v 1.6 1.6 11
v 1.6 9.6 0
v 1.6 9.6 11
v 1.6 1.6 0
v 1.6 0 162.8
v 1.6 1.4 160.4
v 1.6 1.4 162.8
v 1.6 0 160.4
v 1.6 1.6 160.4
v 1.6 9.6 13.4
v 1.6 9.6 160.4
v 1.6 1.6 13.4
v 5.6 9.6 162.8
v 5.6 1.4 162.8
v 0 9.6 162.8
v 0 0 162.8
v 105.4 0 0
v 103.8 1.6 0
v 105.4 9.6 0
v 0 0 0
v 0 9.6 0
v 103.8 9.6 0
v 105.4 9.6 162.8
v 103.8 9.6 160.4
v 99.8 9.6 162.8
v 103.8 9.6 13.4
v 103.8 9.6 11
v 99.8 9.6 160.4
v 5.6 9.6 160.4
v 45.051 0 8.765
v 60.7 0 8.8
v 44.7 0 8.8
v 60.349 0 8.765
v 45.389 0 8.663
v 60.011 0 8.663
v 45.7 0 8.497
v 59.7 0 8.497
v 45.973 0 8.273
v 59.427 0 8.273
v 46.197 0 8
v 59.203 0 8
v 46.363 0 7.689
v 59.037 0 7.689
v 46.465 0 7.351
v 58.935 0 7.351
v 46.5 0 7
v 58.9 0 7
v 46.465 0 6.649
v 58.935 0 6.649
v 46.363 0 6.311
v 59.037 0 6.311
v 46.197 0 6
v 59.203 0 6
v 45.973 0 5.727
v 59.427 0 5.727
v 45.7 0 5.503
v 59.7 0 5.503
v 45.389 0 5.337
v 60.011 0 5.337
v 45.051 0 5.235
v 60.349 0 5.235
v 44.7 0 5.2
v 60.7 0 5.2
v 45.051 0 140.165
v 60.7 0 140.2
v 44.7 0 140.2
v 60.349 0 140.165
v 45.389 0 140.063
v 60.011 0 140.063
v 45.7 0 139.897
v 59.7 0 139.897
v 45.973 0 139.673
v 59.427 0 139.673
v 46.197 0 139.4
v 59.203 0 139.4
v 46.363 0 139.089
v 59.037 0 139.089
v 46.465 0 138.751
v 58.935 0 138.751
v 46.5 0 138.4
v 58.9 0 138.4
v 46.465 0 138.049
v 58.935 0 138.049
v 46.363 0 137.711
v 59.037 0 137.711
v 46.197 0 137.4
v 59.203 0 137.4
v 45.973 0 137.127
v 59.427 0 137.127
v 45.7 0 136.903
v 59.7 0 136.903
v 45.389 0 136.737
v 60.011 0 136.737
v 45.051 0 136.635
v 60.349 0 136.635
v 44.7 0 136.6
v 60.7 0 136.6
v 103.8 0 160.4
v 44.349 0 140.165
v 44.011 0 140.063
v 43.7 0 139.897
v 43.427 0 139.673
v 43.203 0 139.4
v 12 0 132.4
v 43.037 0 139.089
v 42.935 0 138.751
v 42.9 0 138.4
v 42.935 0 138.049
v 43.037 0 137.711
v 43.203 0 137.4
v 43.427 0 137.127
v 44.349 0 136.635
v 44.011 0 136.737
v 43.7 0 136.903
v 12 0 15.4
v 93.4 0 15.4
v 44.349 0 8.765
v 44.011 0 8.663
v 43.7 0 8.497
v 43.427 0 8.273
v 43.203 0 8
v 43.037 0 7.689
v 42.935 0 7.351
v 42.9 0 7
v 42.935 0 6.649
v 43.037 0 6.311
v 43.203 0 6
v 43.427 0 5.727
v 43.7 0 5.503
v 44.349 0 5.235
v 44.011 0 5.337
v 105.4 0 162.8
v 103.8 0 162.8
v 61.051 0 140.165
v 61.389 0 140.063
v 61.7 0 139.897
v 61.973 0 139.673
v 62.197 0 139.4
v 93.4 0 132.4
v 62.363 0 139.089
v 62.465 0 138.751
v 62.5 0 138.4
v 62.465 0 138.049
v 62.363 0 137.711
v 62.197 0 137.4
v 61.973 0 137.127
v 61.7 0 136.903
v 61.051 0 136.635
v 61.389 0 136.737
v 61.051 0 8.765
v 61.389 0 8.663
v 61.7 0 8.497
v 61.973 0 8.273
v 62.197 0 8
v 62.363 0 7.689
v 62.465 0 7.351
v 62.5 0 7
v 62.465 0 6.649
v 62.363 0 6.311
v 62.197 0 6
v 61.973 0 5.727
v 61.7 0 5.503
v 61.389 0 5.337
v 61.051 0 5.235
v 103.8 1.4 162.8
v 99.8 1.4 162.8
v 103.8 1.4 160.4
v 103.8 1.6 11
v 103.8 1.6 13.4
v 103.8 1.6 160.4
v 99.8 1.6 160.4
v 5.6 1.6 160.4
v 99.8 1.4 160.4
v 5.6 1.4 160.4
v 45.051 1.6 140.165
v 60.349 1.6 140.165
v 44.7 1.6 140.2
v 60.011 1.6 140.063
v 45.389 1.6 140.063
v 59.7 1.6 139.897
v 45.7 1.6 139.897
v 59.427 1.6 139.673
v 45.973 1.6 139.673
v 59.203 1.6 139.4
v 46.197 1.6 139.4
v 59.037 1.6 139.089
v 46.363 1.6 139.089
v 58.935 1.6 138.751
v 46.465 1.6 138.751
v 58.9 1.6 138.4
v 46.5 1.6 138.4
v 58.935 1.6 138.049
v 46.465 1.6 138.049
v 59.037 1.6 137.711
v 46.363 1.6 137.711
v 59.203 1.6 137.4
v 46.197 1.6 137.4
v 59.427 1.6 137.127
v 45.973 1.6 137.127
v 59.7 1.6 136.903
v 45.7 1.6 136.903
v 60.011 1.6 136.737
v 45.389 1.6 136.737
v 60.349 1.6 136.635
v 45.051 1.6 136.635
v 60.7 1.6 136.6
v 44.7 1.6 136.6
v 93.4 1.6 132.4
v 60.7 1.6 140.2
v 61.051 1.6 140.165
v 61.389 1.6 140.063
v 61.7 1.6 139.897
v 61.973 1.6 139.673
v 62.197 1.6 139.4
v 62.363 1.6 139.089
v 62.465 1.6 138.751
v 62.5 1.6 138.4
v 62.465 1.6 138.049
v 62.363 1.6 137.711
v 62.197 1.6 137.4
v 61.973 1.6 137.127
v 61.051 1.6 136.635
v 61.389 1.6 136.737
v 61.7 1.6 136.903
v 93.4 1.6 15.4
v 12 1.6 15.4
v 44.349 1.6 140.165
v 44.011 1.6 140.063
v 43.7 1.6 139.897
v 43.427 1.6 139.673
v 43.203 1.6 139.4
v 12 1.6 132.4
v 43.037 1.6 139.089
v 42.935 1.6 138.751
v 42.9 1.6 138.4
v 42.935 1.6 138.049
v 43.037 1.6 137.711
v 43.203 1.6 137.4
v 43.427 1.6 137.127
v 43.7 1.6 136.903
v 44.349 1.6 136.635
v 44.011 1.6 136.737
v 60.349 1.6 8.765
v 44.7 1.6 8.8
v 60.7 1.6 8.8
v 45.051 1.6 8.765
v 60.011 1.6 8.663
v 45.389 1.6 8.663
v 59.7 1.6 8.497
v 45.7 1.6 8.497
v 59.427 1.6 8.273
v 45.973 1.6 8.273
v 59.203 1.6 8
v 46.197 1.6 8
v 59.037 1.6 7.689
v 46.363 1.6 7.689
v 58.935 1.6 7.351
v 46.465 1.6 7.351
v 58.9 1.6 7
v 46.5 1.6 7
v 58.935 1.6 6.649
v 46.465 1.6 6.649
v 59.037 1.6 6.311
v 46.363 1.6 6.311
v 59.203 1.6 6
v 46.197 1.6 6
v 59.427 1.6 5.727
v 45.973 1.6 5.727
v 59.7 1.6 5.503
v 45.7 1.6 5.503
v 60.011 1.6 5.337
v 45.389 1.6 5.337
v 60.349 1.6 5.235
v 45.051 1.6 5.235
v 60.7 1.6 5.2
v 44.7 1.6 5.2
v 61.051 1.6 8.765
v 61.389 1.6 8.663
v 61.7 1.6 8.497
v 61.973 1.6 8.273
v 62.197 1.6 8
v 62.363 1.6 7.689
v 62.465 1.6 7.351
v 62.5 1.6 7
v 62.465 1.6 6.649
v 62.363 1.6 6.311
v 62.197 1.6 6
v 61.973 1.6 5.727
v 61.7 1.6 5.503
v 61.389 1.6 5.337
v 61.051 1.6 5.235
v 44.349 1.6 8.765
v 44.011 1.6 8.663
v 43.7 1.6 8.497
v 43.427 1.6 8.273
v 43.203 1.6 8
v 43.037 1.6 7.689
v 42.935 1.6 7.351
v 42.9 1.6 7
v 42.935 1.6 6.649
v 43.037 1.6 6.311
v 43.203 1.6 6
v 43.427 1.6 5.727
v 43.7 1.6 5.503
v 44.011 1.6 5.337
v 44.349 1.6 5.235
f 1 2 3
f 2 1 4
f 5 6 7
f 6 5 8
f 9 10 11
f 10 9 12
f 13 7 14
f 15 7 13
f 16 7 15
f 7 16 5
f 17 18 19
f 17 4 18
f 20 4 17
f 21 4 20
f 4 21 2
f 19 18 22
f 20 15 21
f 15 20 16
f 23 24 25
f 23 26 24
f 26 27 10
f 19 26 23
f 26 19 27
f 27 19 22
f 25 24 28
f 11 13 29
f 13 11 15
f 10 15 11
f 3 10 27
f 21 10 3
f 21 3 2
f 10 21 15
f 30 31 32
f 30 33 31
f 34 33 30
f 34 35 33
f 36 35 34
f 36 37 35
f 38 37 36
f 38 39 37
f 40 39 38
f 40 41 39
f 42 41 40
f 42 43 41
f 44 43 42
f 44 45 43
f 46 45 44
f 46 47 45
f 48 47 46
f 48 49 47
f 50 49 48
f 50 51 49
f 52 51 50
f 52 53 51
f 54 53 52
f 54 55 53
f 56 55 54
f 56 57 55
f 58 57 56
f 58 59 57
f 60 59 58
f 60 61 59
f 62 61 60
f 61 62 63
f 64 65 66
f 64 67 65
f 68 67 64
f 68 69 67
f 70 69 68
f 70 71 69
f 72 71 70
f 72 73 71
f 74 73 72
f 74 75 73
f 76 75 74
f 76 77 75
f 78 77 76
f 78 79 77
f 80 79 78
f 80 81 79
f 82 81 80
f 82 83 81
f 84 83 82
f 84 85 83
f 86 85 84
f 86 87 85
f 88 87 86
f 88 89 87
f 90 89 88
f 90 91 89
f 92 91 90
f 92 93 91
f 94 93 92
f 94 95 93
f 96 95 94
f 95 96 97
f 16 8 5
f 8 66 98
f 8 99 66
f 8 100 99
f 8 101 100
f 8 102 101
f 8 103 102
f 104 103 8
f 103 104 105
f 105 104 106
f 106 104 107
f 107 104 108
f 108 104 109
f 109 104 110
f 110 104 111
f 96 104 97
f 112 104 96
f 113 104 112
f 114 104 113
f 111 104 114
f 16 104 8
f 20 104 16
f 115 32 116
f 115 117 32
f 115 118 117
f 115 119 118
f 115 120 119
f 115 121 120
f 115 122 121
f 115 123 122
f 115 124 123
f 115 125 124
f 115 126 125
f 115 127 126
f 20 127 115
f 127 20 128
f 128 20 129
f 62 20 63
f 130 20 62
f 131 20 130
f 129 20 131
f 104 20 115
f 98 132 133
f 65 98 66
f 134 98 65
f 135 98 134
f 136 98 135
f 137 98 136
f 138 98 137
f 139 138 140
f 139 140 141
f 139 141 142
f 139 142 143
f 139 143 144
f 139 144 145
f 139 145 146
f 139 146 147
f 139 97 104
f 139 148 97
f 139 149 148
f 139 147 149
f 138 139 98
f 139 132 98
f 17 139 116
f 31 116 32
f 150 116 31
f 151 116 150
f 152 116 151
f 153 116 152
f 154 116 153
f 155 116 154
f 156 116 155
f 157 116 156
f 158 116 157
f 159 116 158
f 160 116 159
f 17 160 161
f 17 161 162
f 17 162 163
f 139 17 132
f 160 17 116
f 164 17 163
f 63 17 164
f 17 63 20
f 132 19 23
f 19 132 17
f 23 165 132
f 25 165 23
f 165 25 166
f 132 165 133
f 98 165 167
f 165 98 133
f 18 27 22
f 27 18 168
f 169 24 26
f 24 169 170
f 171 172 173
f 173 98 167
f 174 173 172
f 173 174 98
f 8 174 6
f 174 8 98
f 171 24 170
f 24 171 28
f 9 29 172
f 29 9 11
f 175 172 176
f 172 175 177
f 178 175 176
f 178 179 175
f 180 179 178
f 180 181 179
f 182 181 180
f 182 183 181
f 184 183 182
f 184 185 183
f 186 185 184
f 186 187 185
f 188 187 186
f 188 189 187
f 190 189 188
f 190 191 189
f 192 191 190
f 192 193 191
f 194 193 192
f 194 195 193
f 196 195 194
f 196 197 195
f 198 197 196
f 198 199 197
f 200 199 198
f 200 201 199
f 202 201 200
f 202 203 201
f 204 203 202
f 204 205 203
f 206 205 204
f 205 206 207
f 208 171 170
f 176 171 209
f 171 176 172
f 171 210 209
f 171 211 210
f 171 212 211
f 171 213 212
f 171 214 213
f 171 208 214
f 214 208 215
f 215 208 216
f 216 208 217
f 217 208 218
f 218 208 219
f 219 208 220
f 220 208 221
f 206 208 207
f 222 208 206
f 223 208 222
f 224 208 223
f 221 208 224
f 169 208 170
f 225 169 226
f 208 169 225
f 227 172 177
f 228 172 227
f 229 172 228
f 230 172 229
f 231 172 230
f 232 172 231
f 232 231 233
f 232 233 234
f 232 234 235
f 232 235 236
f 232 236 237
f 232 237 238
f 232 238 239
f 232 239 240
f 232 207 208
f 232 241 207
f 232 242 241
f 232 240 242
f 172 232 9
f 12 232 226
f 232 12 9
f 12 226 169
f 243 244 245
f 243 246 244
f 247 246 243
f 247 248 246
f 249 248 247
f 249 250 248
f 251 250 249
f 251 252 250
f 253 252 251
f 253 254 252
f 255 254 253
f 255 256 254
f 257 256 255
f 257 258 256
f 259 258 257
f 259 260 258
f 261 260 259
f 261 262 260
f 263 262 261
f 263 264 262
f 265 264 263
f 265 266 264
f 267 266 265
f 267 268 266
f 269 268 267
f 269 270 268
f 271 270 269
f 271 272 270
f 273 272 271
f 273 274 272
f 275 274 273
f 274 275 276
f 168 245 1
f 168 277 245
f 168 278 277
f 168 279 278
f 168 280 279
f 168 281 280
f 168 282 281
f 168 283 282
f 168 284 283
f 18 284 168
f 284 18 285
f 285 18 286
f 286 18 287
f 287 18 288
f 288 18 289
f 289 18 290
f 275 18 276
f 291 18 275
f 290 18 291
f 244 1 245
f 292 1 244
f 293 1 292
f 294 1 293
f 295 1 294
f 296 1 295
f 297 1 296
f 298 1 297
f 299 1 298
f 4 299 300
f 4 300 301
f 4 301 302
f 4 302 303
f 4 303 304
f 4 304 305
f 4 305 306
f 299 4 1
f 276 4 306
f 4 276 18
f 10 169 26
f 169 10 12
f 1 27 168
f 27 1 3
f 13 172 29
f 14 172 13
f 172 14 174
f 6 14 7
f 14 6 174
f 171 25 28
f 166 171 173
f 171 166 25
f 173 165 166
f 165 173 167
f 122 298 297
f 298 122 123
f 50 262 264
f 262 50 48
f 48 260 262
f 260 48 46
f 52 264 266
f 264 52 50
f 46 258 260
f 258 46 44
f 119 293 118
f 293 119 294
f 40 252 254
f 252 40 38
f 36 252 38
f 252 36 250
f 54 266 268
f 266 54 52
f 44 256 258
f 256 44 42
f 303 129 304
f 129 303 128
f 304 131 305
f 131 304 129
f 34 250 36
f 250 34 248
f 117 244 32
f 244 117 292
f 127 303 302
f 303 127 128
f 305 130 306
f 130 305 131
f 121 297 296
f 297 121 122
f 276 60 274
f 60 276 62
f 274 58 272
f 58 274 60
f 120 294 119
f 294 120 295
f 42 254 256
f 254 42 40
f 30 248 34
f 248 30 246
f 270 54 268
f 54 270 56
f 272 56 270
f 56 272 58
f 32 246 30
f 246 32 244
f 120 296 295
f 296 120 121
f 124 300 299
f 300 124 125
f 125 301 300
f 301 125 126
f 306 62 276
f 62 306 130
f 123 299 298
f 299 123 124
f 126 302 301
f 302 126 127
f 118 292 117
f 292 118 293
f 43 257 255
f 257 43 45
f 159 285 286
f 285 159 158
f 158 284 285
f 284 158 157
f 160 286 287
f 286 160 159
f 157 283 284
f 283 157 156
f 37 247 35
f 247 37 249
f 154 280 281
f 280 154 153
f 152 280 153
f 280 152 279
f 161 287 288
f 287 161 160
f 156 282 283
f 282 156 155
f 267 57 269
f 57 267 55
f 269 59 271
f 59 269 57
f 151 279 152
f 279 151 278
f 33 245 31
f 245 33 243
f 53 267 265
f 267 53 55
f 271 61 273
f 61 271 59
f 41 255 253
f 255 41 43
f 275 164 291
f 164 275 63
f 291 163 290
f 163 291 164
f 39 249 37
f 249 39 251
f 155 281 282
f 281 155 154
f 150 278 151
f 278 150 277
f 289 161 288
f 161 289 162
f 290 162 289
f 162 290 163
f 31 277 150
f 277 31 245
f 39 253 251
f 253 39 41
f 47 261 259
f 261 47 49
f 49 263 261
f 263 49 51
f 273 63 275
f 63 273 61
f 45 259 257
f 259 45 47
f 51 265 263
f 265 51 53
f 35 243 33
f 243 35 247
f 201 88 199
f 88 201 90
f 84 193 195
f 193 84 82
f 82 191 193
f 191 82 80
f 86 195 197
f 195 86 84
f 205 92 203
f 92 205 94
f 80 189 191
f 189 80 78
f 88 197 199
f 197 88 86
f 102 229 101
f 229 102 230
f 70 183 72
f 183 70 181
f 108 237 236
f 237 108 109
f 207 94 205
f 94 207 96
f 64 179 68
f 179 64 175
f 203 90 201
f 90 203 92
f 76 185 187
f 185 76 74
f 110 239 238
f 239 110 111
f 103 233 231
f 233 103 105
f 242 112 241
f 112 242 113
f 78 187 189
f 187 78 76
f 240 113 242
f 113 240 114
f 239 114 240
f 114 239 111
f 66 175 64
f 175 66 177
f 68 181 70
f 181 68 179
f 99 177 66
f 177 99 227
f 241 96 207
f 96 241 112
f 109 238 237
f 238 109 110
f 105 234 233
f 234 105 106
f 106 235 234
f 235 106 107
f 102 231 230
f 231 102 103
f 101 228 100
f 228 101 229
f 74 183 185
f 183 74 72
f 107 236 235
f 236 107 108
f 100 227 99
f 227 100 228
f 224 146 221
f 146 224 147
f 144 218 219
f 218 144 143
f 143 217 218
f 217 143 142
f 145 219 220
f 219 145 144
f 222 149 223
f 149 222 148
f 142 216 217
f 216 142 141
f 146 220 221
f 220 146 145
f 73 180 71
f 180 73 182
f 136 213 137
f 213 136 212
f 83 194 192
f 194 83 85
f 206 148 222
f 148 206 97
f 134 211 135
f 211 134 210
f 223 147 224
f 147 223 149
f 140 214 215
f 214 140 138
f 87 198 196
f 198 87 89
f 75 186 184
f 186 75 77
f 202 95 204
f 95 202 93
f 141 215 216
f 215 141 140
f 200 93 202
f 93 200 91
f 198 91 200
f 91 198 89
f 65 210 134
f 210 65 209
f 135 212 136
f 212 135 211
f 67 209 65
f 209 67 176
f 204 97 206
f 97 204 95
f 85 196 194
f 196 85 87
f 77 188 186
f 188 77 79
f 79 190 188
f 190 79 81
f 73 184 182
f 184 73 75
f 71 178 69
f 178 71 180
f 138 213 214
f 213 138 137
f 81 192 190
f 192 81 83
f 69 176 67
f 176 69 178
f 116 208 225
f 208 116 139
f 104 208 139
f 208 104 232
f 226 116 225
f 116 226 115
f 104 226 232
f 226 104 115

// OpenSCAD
// file: ../params.scad
// Общие размеры первой итерации: один отсек 3.5" и детали вокруг него.
// Корпус диска — SFF-8301, таблица 3-1, класс высоты 26.10 мм (максимум).
// Положение разъёма SATA сюда не зашито: его снимают калибром gauge.scad
// с конкретного диска и только потом переносят в окно салазок.

drive_width = 101.60;
drive_height = 26.10;
drive_length = 147.00;

wall = 4.0;
floor_t = 4.0;
lip_t = 3.0;
nib = 4.0;
side_clearance = 0.8;
top_clearance = 1.5;

front_gap = 3.0;
plate_t = 8.0;
front_extra = front_gap + plate_t;

pusher_d = 4.4;
m3_clear = 3.4;
m3_pilot = 2.6;
m3_nut_af = 5.5;
m3_nut_t = 2.8;

cavity_w = drive_width + side_clearance;
outer_w = cavity_w + 2 * wall;
wall_h = drive_height + top_clearance;
body_z = drive_length + front_extra;

strap_z = 18;
strap_t = 4.0;
strap_foot = 14.0;

plate_screw_x = [14, drive_width - 14];
plate_z0 = drive_length + front_gap;
plate_screw_z = plate_z0 + plate_t / 2;
plate_bar_h = 10;
tower_w = 28;
tower_x = drive_width / 2 - tower_w / 2;

sled_w = 78;
sled_h = 48;
sled_t = 8;
sled_window_w = 50;
sled_window_h = 18;
sled_hole_inset = 6;

// Каркас 1U. Шаг EIA — 44.45 мм, уголок 44.0 мм, чтобы соседний юнит не тёрся.
// Гнездо 8.4 мм принимает трубку до 8 мм. Хомут тянет её к внешней стенке гнезда.
// При rod_d = 6 между трубками 29 мм: пол корзины 1.6 мм, диск 26.1 мм, воздух ~1 мм.
// При 8 мм диск 26.1 мм в этот юнит уже не входит.
unit_h = 44.0;
rod_d = 6;
socket_d = 8.4;
// 10 мм хватает, чтобы трубка села и хомут её зажал. Столбик тогда 12 мм,
// и четыре корзины остаются внутри просвета 450 мм.
socket_depth = 10;
socket_wall = 1.6;
skin = 0.8;
foot = 1.6;
roof = 1.4;
tie_w = 3.2;
// Просвет между направляющими стойки 19 дюймов — 450 мм.
opening_w = 450;
bay_count = 4;
bay_gap = 1.0;
basket_wall = 1.6;
basket_clear = 0.6;
rail_t = 1.6;
// Торец разъёма выступает за ближнюю трубку к каретке, чтобы трубка не перекрыла SATA.
plug_overhang = 16;
stop_margin = 14;

socket_r = socket_d / 2;
post_x = socket_depth + 2;
axis_inset = skin + socket_r;
bottom_axis_y = foot + socket_r;
top_axis_y = unit_h - roof - socket_r;
depth_z0 = axis_inset + socket_r + socket_wall;
post_z = depth_z0 + socket_depth;
basket_w = drive_width + basket_clear + 2 * basket_wall;
inner_w = bay_count * basket_w + (bay_count - 1) * bay_gap;
frame_w = inner_w + 2 * post_x;
rod_span = drive_length - plug_overhang + stop_margin;
frame_depth = rod_span + 2 * axis_inset;
rod_y0 = foot + rod_d / 2;
rod_y1 = unit_h - roof - rod_d / 2;
rod_gap = (rod_y1 - rod_d / 2) - (rod_y0 + rod_d / 2);

// KW11-3Z: корпус около 19.8 x 10.2 x 6.4 мм, два отверстия 2.35–2.5 мм
// с шагом 9.5 мм под винты M2.
switch_hole_d = 2.5;
switch_pitch = 9.5;

$fn = 32;
// file: params.scad
// Наборный ярус. Стоит рядом с cad/rack.scad и ту стойку не заменяет.
// Диск, юнит, гнездо 8.4 мм и ширина четырёх отсеков — из ../params.scad.
// Здесь их не копируют: если правка там, ярус подхватит её сам.
include <../params.scad>

$fn = 32;

// Сборка на трубке 6 мм. Гнездо принимает и 8 мм, но тогда диск 26.1 мм
// в юнит 44 мм уже не входит: между трубками остаётся около 29 мм.
m4_clear = 4.4;
board_t = 1.6;
standoff_h = 6;
comp_max = 10;
tray_t = 2.4;
tie_hole = 3.6;

// Плата Pi 4: 85 × 56 мм. Отверстия Ø2.7 под M2.5, шаг 58 × 49,
// отступ 3.5 от левого края и от обеих кромок стороны 56 мм.
// Чертёж Raspberry Pi Ltd RP-008343-DS-1. В пластике проход 2.9 мм.
// https://pip-assets.raspberrypi.com/categories/545-raspberry-pi-4-model-b/documents/RP-008343-DS-1-raspberry-pi-4-mechanical-drawing.pdf
pi_l = 85;
pi_w = 56;
pi_hole_d = 2.9;
pi_pitch_x = 58;
pi_pitch_y = 49;
pi_inset = 3.5;

sata_l = 100;
sata_w = 80;
ctrl_l = 100;
ctrl_w = 100;

// Шпилька M4 не встаёт рядом с гнездом в столбике 12 мм,
// а столбик шире раздвигает каркас за просвет 450 мм.
// Поэтому колодец шпильки — в переднем блоке, гнёзда за ним по глубине.
rod_hole_x = post_x / 2;
rod_hole_z = 5;
socket_gap = 1.6;

width_axis_z = rod_hole_z + m4_clear / 2 + socket_gap + socket_r;
depth_bore_z = width_axis_z + socket_r + socket_gap;
stack_post_z = depth_bore_z + socket_depth;
depth_axis_x = post_x / 2;

// Ложемент. Его z = 0 — передний край ушка.
ear_past = rod_d / 2 + 4;
cradle_lip_t = 2.4;
cradle_cheek_t = 2.4;
cradle_cheek = 4;
cradle_gap_tube = 1.0;
cradle_rear_inset = 22;
cradle_lip_h = 8;

cradle_z_front = ear_past;
cradle_z_drive0 = cradle_z_front + rod_d / 2 + cradle_gap_tube + cradle_lip_t;
cradle_z_drive1 = cradle_z_drive0 + drive_length;
cradle_z_rear = cradle_z_drive1 - cradle_rear_inset;
cradle_z_end = cradle_z_drive1 + cradle_cheek_t;

// Передняя трубка яруса совпадает с гнездом уголка.
cradle_z0 = width_axis_z - cradle_z_front;
drive_z0 = cradle_z0 + cradle_z_drive0;
drive_z1 = cradle_z0 + cradle_z_drive1;
mid_rail_z = cradle_z0 + cradle_z_rear;
cradle_y = rod_y0 + rod_d / 2;

// Задний отсек: кабели и платы лёжа. Договор просит не меньше 90 мм.
// Контрольная плата 100 мм, поэтому между осями трубок лотка 120 мм.
cable_gap = 36;
tray_span = 120;
bay_rail_z = drive_z1 + cable_gap;
rear_width_z = bay_rail_z + tray_span;
stack_depth = rear_width_z + width_axis_z;
tray_len = tray_span + 2 * ear_past;
tray_z0 = bay_rail_z - ear_past;

width_tube_len = frame_w - 2 * (post_x - socket_depth);
depth_tube_len = stack_depth - 2 * depth_bore_z;
rail_end_gap = 0.4;
rail_x0 = depth_axis_x + rod_d / 2 + rail_end_gap;
cross_tube_len = frame_w - 2 * rail_x0;

// Хомут рельса. Оси локальные, сборка совмещает их с трубками.
clamp_dx = 10;
clamp_cz = 12;

stud_extra = 16;
ear_out = 16;
ear_t = 3.2;

sata_tray_w = sata_l + 16;
ctrl_tray_w = ctrl_l + 16;
pi_tray_w = pi_l + 16;

bay_clear = (rear_width_z - rod_d / 2) - drive_z1;
board_stack = tray_t + standoff_h + board_t + comp_max;
// main file
// Ложемент одного диска. Печатать полом вниз.
// Передний упор не даёт диску выйти вперёд. Торец разъёма открыт:
// сзади только щёчки по 4 мм, вилка SATA и питание проходят посередине.
// Ушки лежат на нижней передней трубке и на средней поперечине.
// В пластик диска не вкручиваться: резьба диска 6-32, здесь её нет.
include <params.scad>

module drive_cradle() {
    lip_top = rail_t + cradle_lip_h;
    z_win0 = cradle_z_drive0 + 2;
    z_win1 = cradle_z_rear - rod_d / 2 - 3;
    rail_w = 12;
    tie_spread = 16;

    difference() {
        union() {
            translate([0.2, 0, 0])
                cube([basket_w - 0.4, rail_t, cradle_z_drive1]);

            for (x = [0, basket_w - basket_wall])
                translate([x, 0, 0])
                    cube([basket_wall, lip_top, cradle_z_end]);

            translate([basket_wall - 0.2, rail_t - 0.2, cradle_z_drive0 - cradle_lip_t])
                cube([basket_w - 2 * basket_wall + 0.4, cradle_lip_h + 0.2, cradle_lip_t]);

            translate([basket_wall - 0.2, rail_t - 0.2, cradle_z_drive1])
                cube([cradle_cheek + 0.2, cradle_lip_h + 0.2, cradle_cheek_t]);
            translate([basket_w - basket_wall - cradle_cheek, rail_t - 0.2, cradle_z_drive1])
                cube([cradle_cheek + 0.2, cradle_lip_h + 0.2, cradle_cheek_t]);
        }

        translate([rail_w, -0.2, z_win0])
            cube([basket_w - 2 * rail_w, rail_t + 0.4, z_win1 - z_win0]);

        for (z = [cradle_z_front, cradle_z_rear])
            for (dx = [-tie_spread / 2, tie_spread / 2])
                translate([basket_w / 2 + dx, -0.2, z])
                    rotate([-90, 0, 0])
                        cylinder(h = rail_t + 0.4, d = tie_hole);
    }
}

drive_cradle();
